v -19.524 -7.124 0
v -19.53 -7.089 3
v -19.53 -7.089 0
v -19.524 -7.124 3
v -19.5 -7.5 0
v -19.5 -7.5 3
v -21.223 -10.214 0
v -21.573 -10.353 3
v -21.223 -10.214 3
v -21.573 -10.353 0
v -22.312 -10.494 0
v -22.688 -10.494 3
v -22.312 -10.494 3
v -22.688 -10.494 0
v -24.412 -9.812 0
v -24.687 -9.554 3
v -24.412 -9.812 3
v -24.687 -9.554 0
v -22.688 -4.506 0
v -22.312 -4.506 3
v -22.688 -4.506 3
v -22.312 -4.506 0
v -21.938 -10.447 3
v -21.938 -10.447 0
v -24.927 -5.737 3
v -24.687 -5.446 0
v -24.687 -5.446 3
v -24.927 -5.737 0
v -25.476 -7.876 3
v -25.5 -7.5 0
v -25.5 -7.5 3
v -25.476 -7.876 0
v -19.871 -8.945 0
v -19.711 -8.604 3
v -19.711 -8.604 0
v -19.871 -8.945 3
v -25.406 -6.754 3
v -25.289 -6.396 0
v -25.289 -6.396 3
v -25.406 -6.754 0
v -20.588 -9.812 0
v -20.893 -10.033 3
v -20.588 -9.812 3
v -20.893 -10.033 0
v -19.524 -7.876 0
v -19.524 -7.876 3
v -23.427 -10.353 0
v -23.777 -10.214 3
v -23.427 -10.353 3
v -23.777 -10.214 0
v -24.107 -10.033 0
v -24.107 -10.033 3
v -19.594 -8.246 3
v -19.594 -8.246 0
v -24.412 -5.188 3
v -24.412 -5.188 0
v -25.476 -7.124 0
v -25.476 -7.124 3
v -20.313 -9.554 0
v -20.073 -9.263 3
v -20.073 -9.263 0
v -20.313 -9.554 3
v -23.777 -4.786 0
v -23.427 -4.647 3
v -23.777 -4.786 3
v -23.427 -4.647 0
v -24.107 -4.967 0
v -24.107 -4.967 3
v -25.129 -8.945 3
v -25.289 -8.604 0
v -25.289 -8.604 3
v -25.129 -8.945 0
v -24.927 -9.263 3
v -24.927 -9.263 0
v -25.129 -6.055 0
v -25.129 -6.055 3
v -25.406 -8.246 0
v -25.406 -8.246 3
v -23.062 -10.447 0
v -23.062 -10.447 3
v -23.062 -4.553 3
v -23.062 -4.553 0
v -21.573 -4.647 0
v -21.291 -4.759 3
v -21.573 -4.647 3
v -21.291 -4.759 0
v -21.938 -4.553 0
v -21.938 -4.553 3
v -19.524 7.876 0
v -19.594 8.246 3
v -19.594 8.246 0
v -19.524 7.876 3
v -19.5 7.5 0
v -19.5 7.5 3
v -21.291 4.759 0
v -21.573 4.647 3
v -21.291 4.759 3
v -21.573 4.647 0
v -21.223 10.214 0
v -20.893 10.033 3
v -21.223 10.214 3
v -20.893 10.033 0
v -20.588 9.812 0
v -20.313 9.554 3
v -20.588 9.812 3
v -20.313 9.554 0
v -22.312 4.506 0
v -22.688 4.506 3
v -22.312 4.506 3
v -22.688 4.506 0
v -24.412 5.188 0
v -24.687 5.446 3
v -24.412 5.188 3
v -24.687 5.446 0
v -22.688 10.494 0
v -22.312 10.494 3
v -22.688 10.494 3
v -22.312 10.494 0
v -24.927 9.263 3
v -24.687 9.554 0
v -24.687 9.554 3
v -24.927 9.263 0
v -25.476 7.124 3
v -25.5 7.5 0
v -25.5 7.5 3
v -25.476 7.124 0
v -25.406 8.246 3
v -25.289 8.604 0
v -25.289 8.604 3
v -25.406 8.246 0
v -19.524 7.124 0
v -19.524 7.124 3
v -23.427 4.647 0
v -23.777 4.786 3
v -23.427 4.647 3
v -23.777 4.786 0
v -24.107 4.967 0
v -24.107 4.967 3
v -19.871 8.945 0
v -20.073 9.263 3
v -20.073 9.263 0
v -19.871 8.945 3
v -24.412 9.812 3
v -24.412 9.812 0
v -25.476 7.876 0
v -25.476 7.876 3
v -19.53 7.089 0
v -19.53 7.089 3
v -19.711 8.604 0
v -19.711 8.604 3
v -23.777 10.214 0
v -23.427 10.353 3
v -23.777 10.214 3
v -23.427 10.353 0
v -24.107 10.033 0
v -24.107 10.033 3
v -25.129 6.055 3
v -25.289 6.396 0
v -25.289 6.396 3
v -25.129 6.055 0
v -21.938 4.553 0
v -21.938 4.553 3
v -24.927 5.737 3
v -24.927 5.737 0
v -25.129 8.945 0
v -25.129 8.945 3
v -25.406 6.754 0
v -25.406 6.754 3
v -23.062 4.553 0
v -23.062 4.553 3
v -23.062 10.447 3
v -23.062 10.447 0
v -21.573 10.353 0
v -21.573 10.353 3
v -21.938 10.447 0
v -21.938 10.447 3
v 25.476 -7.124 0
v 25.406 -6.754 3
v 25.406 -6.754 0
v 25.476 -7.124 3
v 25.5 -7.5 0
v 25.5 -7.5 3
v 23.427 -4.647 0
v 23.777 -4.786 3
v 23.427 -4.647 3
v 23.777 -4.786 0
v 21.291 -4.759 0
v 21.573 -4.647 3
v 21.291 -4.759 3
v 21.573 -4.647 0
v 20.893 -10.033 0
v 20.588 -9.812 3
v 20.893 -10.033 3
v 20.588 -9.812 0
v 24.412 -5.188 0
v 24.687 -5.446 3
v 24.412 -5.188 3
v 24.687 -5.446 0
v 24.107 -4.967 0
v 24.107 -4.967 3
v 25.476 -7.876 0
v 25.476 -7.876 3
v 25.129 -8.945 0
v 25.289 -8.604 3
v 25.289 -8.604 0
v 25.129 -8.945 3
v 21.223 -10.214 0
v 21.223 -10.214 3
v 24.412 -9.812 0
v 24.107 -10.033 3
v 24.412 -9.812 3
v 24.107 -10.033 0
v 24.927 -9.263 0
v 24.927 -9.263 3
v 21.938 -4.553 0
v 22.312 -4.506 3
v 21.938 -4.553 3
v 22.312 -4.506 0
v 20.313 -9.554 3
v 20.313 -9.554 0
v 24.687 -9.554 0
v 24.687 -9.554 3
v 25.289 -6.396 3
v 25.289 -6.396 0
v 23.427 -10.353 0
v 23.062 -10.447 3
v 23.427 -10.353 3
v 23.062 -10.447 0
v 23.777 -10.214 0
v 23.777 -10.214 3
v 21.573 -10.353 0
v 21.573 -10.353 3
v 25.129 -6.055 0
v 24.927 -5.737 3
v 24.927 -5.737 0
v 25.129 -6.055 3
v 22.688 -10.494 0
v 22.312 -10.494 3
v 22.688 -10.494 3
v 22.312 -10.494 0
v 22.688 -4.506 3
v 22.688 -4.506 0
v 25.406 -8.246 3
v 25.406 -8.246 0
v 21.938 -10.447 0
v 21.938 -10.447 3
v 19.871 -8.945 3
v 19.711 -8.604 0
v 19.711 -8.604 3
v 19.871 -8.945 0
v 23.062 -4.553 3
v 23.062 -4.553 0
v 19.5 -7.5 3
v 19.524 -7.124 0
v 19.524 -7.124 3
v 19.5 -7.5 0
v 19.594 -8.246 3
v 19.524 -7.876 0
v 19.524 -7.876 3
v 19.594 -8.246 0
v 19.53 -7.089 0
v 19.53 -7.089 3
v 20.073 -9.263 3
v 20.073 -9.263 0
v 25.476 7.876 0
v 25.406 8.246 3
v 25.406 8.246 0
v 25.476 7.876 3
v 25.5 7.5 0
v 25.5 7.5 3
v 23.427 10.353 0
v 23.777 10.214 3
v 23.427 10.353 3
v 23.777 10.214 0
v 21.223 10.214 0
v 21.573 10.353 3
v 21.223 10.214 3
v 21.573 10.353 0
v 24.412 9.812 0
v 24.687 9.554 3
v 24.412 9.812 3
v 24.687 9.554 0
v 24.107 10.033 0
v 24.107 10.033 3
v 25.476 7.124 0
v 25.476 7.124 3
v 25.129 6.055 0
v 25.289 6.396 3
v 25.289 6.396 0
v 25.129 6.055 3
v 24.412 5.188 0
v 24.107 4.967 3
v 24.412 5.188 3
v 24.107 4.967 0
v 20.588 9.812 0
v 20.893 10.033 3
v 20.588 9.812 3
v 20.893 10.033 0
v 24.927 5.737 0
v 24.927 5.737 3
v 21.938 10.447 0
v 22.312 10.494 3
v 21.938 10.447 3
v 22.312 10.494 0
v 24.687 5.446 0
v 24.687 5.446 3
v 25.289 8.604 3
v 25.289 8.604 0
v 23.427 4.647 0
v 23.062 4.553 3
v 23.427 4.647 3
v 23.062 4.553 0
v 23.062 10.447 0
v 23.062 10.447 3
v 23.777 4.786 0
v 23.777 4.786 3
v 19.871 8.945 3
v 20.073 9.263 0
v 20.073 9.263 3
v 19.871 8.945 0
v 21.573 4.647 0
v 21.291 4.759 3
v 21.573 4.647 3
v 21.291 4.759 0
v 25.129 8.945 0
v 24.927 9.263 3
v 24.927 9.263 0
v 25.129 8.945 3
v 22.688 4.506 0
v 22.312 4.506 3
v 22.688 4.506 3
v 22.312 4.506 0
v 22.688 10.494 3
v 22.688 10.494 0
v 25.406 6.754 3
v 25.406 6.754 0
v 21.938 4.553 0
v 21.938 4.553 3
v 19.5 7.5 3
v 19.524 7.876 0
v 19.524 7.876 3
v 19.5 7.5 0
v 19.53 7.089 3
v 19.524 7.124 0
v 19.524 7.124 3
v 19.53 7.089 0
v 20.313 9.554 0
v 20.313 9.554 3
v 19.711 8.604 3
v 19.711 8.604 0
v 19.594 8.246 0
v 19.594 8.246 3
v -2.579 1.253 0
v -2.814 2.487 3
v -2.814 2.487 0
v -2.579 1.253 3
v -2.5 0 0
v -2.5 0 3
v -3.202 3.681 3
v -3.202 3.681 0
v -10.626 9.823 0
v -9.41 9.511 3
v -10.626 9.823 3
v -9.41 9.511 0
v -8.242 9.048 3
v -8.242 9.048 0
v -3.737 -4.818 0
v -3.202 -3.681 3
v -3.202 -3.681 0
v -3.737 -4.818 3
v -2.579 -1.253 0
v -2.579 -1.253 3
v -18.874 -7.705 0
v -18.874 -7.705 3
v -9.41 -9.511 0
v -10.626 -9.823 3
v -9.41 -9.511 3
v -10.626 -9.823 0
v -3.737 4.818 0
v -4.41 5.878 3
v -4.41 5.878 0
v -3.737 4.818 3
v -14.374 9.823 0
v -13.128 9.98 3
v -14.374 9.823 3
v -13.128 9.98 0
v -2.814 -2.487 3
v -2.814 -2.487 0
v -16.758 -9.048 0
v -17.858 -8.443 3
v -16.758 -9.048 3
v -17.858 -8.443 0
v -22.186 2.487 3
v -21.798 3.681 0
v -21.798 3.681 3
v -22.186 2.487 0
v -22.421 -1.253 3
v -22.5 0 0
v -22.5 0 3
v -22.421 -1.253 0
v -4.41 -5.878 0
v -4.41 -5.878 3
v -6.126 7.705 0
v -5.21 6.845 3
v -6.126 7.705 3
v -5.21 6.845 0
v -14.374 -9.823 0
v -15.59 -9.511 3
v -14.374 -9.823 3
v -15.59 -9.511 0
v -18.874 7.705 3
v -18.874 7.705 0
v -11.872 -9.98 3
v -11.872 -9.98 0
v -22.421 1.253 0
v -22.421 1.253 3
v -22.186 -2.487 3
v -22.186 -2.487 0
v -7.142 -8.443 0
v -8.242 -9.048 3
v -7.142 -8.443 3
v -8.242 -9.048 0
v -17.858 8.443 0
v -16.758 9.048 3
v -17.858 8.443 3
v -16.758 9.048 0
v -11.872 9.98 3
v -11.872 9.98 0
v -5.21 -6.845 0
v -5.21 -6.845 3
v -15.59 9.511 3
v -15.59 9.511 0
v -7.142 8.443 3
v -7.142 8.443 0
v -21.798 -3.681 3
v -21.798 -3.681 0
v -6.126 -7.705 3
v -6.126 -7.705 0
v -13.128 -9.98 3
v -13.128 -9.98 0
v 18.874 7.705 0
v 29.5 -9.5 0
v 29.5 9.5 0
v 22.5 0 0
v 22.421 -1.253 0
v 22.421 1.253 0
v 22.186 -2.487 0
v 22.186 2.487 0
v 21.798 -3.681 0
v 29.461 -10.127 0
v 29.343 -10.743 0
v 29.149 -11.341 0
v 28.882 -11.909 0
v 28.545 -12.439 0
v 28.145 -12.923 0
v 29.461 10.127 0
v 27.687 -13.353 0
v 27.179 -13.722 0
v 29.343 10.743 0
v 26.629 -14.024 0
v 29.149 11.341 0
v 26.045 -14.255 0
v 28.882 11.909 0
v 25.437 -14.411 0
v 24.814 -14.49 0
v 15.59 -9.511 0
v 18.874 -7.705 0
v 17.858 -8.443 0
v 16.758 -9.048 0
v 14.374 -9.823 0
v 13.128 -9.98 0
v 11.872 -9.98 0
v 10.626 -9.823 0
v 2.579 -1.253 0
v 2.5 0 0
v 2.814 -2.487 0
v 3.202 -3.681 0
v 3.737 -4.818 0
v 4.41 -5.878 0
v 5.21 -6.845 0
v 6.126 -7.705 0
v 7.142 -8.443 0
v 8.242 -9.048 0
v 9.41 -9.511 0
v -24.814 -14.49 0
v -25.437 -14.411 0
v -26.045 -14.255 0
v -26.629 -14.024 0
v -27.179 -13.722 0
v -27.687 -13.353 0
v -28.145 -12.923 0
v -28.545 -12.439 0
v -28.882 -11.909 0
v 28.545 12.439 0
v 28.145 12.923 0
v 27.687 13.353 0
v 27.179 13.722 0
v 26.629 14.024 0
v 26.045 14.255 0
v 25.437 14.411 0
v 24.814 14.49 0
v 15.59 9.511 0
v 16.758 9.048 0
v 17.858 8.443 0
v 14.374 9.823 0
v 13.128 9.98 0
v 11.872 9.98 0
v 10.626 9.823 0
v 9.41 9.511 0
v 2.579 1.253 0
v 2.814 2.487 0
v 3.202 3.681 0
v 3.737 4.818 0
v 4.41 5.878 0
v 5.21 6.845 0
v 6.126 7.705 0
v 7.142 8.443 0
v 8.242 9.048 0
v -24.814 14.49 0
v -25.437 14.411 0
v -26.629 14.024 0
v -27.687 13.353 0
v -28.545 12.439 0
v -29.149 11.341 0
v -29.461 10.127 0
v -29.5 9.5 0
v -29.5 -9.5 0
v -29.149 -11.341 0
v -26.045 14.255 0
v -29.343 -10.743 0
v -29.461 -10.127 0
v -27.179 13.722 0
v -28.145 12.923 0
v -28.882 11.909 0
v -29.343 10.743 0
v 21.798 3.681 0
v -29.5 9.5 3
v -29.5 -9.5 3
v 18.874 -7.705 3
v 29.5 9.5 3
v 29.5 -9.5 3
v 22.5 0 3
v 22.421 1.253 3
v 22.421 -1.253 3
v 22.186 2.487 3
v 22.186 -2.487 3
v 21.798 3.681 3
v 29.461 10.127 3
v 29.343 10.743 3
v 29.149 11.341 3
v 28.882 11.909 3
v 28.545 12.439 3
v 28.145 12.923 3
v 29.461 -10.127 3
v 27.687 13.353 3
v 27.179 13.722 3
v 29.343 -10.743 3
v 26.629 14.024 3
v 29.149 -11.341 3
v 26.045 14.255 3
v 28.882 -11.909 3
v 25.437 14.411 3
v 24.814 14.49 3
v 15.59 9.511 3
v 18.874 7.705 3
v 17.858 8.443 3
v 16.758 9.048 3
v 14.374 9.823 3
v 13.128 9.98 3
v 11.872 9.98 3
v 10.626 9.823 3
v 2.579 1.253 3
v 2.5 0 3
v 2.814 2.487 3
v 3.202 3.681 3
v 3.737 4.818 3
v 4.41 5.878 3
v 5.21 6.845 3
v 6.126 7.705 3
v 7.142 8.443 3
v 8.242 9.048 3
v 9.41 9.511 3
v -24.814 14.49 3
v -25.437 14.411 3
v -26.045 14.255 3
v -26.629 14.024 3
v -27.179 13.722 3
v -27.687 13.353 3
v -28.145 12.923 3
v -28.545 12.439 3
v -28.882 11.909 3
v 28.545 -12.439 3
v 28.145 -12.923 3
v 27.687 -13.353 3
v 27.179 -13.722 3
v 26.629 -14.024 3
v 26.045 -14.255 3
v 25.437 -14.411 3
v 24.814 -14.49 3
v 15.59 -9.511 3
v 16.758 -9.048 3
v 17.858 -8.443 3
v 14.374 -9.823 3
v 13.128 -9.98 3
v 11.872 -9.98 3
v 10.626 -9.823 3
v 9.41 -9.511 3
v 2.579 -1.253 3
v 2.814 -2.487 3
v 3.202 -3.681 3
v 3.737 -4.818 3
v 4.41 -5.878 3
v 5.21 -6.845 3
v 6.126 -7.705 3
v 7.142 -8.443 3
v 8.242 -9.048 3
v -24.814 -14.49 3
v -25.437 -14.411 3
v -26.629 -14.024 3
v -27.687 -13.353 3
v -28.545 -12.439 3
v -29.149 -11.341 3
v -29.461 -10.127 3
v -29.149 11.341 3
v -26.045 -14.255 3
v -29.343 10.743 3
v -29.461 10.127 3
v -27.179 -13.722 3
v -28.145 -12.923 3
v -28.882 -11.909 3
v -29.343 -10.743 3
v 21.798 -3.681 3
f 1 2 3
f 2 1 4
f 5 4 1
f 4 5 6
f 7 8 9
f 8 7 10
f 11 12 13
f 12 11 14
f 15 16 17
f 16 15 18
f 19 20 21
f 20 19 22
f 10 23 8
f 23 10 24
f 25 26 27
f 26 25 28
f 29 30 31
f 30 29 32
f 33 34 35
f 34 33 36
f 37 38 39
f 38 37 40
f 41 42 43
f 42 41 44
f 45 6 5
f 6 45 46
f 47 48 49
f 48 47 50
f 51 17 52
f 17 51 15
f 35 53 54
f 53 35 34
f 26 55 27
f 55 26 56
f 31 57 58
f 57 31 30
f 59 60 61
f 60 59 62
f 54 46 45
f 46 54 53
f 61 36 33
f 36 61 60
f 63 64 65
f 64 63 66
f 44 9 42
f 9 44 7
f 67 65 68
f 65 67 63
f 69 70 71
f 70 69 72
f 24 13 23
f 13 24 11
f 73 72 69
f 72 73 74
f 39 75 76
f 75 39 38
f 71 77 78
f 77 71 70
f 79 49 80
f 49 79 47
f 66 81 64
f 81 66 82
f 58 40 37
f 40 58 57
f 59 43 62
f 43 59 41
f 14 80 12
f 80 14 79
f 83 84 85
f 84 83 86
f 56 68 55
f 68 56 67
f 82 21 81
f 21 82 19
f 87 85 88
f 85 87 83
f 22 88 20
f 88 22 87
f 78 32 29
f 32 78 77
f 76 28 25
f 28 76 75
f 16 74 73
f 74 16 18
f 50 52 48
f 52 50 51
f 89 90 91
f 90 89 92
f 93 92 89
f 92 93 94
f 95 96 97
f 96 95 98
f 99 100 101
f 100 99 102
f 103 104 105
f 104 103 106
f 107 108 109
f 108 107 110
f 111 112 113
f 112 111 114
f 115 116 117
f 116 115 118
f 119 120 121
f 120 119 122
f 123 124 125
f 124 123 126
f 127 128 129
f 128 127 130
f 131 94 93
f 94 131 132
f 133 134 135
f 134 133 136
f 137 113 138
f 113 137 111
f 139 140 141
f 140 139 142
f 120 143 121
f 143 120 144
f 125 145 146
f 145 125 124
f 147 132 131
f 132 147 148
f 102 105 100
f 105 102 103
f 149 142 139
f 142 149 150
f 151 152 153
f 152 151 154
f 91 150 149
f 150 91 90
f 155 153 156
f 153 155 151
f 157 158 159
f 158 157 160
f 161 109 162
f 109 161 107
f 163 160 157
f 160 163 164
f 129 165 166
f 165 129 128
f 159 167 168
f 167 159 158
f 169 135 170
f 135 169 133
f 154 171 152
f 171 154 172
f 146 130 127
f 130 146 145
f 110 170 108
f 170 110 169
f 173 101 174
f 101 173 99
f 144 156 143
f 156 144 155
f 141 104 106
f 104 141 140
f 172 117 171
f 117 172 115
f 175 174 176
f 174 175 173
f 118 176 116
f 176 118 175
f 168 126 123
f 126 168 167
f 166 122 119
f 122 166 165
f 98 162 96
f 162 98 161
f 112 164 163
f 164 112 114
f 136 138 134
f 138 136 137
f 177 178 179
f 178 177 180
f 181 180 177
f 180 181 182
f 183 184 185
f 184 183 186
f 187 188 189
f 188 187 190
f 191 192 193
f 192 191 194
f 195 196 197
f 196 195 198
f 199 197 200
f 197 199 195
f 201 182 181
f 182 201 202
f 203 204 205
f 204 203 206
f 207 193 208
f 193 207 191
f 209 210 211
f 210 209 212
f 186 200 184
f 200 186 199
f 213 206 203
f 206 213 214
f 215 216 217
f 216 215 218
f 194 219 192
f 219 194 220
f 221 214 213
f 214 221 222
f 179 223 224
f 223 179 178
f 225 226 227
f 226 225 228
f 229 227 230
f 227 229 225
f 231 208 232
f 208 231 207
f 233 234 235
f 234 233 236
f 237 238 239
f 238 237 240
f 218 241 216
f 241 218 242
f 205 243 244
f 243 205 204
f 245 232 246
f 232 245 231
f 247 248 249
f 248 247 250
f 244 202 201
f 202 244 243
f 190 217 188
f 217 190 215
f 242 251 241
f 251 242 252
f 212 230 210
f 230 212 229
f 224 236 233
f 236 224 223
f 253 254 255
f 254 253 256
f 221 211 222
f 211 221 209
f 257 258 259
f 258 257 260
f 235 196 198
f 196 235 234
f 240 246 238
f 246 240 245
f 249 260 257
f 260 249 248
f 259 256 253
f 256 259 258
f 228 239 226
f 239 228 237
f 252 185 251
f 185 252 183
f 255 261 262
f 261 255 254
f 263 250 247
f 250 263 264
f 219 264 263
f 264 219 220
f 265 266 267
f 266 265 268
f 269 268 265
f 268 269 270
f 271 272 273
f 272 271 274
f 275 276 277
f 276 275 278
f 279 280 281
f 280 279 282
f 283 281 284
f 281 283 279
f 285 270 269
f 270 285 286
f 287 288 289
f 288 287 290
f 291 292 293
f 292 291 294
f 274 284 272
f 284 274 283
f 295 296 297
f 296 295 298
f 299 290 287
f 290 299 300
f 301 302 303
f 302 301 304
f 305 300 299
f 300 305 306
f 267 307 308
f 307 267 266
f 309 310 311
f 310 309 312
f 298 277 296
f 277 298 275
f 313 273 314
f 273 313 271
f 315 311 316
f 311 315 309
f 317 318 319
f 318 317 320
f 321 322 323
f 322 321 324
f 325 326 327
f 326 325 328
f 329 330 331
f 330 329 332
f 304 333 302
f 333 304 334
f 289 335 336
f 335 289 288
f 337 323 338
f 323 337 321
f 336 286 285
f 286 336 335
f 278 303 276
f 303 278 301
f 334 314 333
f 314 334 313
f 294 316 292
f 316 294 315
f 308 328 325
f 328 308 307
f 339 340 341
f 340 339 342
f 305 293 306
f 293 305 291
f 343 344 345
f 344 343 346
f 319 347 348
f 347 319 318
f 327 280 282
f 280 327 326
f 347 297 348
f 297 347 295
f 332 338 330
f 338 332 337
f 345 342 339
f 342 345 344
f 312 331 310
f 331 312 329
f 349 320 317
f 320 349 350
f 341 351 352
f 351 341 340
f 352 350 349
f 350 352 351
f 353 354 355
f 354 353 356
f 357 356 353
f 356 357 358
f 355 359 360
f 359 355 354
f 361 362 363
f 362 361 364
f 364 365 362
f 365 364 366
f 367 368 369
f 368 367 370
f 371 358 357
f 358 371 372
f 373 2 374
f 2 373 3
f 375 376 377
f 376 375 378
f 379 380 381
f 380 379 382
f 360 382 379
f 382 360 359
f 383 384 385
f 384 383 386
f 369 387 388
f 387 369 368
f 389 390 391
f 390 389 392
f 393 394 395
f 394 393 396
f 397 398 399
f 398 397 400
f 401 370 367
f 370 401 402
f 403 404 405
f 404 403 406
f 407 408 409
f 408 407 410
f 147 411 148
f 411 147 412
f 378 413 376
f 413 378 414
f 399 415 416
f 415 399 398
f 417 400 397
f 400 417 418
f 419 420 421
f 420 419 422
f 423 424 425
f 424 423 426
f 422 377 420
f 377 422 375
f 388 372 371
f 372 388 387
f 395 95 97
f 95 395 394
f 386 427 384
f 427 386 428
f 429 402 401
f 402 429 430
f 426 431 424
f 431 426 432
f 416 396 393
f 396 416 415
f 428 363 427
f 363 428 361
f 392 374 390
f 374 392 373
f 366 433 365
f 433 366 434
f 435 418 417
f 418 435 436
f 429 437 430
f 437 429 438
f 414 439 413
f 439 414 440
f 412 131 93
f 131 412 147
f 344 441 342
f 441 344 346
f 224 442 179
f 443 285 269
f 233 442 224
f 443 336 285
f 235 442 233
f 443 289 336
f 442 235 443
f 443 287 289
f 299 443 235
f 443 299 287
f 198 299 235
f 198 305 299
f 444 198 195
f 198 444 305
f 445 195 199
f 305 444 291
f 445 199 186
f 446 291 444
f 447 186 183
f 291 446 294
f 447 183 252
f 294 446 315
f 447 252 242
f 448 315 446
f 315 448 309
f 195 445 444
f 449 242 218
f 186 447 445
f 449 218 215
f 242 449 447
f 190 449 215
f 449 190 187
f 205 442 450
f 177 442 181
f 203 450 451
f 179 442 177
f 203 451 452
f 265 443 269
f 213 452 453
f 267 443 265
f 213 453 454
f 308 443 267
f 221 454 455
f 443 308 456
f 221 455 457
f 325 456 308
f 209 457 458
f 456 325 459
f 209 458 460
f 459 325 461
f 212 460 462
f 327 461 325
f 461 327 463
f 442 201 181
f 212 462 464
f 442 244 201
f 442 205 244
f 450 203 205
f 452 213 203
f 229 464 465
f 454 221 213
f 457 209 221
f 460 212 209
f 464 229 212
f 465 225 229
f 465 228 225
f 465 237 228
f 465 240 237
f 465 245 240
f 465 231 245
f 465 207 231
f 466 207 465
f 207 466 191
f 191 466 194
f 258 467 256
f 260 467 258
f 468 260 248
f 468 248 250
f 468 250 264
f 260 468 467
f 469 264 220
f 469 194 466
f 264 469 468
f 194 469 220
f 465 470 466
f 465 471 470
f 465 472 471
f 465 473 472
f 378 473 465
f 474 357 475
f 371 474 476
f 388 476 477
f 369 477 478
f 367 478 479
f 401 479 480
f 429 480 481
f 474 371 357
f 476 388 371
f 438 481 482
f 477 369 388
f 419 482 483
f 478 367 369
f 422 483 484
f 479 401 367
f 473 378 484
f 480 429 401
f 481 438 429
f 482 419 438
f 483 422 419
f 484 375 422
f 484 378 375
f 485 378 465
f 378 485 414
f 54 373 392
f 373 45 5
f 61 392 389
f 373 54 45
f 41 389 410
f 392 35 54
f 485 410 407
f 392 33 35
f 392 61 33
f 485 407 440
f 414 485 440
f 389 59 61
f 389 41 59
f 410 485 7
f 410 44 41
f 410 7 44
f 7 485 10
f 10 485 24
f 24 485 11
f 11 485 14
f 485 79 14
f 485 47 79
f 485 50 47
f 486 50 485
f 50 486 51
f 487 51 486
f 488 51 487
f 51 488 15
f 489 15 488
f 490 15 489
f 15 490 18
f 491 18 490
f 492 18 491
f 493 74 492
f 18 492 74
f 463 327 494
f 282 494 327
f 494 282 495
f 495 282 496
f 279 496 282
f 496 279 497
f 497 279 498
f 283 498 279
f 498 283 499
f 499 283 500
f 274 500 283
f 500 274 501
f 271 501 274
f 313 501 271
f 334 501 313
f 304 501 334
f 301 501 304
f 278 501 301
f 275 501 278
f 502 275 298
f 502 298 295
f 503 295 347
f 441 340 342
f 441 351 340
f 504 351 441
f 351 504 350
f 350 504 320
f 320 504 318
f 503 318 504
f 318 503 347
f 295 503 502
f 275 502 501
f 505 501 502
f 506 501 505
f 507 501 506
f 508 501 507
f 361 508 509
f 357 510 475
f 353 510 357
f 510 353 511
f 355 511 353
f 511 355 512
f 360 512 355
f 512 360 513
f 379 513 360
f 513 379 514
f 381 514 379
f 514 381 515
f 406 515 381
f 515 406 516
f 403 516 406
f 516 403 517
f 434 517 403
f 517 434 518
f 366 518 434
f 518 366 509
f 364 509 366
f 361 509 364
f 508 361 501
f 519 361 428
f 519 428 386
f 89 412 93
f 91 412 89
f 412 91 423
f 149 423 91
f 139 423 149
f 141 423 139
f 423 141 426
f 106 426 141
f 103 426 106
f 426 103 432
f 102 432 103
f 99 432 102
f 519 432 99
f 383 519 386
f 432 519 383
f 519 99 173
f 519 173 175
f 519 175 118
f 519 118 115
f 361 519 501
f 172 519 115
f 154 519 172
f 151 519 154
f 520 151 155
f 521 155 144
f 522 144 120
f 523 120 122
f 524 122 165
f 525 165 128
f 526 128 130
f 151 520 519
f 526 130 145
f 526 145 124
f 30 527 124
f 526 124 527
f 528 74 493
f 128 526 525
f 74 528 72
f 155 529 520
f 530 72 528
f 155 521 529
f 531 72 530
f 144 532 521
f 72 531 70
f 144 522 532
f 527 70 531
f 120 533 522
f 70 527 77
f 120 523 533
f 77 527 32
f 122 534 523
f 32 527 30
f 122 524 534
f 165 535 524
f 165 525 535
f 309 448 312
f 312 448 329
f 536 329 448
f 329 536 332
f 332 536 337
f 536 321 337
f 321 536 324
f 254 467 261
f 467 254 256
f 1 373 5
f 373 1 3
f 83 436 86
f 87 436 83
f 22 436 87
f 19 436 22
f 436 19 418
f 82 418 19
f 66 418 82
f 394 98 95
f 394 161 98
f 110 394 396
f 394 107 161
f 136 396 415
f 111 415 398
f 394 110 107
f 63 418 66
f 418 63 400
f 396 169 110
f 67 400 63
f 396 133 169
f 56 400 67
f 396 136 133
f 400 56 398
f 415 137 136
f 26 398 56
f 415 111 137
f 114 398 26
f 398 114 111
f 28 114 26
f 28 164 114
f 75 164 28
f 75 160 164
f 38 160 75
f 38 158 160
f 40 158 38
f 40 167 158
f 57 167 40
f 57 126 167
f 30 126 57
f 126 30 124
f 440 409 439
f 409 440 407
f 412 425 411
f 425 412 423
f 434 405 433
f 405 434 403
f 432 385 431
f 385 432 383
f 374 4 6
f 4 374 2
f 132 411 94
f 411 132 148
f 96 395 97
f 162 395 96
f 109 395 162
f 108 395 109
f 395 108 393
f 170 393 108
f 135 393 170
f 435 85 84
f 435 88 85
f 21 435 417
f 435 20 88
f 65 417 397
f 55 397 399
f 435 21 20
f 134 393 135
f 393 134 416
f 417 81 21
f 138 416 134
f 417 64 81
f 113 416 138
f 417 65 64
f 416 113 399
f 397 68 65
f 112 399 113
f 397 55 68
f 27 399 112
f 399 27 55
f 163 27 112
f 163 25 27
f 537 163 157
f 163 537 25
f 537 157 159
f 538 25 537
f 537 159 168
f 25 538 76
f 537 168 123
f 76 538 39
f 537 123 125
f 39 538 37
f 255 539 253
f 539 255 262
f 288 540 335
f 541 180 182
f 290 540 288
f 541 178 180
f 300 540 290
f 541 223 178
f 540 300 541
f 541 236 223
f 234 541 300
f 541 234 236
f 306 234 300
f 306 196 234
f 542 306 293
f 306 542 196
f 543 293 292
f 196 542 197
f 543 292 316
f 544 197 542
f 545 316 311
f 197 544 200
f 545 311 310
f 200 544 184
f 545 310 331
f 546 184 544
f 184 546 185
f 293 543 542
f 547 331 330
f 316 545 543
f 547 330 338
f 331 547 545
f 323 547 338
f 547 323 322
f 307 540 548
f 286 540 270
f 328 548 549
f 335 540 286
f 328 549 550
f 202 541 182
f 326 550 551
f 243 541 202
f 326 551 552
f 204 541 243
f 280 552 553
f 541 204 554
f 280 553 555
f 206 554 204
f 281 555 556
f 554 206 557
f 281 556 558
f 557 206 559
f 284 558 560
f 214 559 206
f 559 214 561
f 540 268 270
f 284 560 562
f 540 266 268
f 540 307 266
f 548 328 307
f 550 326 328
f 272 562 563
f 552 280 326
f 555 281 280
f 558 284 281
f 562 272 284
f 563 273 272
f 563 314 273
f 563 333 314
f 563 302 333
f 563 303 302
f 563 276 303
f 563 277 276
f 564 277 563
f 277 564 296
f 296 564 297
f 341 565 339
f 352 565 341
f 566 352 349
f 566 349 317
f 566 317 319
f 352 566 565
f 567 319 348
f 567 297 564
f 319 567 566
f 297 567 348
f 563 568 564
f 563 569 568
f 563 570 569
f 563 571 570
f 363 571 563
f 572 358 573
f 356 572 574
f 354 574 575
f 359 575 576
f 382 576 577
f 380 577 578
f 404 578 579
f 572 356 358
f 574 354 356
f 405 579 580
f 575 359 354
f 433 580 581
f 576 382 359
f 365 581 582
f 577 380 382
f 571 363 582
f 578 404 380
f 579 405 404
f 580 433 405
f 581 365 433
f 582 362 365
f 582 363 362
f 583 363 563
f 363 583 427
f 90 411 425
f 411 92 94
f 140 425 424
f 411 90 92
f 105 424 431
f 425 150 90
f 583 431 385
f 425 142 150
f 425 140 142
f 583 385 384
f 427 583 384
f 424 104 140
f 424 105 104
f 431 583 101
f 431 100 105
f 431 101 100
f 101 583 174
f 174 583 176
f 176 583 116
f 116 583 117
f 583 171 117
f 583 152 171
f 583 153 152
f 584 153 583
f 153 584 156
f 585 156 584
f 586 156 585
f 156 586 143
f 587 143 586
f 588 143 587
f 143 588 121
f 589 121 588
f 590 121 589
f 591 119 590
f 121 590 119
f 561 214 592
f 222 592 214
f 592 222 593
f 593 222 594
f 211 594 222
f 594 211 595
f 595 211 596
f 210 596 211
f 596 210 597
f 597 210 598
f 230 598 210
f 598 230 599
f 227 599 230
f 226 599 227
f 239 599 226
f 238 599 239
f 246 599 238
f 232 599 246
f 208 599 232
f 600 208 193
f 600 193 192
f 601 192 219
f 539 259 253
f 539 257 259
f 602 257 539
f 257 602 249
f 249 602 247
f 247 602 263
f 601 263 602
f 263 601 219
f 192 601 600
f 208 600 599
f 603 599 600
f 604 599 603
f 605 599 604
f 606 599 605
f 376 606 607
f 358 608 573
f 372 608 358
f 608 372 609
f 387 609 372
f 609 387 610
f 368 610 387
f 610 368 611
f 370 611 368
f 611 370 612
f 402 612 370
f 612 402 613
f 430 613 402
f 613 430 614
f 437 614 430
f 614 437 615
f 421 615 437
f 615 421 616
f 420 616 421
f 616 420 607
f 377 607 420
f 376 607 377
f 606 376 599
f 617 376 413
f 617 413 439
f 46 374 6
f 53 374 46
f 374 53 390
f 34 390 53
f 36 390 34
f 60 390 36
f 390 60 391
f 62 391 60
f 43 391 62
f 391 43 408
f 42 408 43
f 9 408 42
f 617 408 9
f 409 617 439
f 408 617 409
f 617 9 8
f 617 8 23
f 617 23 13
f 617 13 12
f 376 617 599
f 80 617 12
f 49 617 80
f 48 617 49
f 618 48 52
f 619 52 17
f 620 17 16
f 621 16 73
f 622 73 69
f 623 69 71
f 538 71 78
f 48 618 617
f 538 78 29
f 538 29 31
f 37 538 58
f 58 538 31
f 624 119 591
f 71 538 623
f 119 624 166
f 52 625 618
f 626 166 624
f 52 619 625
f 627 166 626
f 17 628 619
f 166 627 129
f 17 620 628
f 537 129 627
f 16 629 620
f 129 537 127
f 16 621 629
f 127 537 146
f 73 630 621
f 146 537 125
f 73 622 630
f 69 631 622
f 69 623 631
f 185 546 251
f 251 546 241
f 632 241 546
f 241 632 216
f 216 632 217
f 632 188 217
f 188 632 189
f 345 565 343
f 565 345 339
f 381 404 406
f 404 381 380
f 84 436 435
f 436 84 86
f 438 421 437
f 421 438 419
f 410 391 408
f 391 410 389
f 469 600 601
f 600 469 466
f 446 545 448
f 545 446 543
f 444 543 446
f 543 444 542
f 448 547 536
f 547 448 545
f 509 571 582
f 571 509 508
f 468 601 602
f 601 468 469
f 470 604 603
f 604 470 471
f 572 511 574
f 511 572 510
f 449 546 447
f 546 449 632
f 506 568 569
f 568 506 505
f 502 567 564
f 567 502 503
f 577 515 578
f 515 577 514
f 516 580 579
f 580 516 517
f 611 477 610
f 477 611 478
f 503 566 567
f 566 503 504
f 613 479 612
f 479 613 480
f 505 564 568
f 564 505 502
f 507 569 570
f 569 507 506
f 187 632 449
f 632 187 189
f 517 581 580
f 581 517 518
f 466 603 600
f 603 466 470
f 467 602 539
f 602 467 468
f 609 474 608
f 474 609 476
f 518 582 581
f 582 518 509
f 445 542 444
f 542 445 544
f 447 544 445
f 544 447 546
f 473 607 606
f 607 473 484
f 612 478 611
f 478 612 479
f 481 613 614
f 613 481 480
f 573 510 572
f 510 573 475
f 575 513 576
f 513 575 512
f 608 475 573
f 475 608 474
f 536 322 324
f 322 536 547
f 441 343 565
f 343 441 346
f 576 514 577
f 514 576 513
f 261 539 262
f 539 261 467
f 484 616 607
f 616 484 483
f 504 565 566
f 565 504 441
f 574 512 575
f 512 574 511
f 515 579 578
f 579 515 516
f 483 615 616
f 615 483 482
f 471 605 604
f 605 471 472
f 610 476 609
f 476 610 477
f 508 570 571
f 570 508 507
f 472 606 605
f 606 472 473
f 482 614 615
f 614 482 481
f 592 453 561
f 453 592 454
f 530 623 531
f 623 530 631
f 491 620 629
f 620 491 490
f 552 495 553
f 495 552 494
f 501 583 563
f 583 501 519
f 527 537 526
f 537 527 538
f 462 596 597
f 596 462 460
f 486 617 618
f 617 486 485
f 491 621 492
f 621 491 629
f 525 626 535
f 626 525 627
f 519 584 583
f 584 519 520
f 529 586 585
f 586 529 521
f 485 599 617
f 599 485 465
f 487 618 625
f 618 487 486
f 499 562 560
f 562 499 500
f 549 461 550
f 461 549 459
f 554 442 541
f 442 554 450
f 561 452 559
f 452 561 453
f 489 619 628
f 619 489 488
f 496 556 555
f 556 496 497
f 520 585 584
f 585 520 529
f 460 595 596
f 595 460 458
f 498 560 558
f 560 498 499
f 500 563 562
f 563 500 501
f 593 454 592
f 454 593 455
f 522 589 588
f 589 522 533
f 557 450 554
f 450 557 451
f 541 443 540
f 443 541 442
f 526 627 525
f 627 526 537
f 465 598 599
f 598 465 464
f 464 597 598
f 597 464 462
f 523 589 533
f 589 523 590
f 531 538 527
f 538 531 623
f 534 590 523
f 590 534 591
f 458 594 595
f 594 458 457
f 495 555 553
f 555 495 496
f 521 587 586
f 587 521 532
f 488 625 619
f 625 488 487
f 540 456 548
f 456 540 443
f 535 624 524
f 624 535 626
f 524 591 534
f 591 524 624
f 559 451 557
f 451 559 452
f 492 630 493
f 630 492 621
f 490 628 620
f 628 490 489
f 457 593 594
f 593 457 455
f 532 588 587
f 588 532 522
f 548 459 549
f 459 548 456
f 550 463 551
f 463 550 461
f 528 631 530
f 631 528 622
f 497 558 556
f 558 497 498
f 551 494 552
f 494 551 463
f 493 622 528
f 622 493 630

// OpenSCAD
$fn = 50;


difference() {
	union() {
		hull() {
			translate(v = [-24.5000000000, 9.5000000000, 0]) {
				cylinder(h = 3, r = 5);
			}
			translate(v = [24.5000000000, 9.5000000000, 0]) {
				cylinder(h = 3, r = 5);
			}
			translate(v = [-24.5000000000, -9.5000000000, 0]) {
				cylinder(h = 3, r = 5);
			}
			translate(v = [24.5000000000, -9.5000000000, 0]) {
				cylinder(h = 3, r = 5);
			}
		}
	}
	union() {
		#translate(v = [-22.5000000000, -7.5000000000, -100.0000000000]) {
			cylinder(h = 200, r = 3.0000000000);
		}
		#translate(v = [-22.5000000000, 7.5000000000, -100.0000000000]) {
			cylinder(h = 200, r = 3.0000000000);
		}
		#translate(v = [22.5000000000, -7.5000000000, -100.0000000000]) {
			cylinder(h = 200, r = 3.0000000000);
		}
		#translate(v = [22.5000000000, 7.5000000000, -100.0000000000]) {
			cylinder(h = 200, r = 3.0000000000);
		}
		#translate(v = [-12.5000000000, 0, 0]) {
			cylinder(h = 3, r = 10.0000000000);
		}
		#translate(v = [12.5000000000, 0, 0]) {
			cylinder(h = 3, r = 10.0000000000);
		}
	}
}
